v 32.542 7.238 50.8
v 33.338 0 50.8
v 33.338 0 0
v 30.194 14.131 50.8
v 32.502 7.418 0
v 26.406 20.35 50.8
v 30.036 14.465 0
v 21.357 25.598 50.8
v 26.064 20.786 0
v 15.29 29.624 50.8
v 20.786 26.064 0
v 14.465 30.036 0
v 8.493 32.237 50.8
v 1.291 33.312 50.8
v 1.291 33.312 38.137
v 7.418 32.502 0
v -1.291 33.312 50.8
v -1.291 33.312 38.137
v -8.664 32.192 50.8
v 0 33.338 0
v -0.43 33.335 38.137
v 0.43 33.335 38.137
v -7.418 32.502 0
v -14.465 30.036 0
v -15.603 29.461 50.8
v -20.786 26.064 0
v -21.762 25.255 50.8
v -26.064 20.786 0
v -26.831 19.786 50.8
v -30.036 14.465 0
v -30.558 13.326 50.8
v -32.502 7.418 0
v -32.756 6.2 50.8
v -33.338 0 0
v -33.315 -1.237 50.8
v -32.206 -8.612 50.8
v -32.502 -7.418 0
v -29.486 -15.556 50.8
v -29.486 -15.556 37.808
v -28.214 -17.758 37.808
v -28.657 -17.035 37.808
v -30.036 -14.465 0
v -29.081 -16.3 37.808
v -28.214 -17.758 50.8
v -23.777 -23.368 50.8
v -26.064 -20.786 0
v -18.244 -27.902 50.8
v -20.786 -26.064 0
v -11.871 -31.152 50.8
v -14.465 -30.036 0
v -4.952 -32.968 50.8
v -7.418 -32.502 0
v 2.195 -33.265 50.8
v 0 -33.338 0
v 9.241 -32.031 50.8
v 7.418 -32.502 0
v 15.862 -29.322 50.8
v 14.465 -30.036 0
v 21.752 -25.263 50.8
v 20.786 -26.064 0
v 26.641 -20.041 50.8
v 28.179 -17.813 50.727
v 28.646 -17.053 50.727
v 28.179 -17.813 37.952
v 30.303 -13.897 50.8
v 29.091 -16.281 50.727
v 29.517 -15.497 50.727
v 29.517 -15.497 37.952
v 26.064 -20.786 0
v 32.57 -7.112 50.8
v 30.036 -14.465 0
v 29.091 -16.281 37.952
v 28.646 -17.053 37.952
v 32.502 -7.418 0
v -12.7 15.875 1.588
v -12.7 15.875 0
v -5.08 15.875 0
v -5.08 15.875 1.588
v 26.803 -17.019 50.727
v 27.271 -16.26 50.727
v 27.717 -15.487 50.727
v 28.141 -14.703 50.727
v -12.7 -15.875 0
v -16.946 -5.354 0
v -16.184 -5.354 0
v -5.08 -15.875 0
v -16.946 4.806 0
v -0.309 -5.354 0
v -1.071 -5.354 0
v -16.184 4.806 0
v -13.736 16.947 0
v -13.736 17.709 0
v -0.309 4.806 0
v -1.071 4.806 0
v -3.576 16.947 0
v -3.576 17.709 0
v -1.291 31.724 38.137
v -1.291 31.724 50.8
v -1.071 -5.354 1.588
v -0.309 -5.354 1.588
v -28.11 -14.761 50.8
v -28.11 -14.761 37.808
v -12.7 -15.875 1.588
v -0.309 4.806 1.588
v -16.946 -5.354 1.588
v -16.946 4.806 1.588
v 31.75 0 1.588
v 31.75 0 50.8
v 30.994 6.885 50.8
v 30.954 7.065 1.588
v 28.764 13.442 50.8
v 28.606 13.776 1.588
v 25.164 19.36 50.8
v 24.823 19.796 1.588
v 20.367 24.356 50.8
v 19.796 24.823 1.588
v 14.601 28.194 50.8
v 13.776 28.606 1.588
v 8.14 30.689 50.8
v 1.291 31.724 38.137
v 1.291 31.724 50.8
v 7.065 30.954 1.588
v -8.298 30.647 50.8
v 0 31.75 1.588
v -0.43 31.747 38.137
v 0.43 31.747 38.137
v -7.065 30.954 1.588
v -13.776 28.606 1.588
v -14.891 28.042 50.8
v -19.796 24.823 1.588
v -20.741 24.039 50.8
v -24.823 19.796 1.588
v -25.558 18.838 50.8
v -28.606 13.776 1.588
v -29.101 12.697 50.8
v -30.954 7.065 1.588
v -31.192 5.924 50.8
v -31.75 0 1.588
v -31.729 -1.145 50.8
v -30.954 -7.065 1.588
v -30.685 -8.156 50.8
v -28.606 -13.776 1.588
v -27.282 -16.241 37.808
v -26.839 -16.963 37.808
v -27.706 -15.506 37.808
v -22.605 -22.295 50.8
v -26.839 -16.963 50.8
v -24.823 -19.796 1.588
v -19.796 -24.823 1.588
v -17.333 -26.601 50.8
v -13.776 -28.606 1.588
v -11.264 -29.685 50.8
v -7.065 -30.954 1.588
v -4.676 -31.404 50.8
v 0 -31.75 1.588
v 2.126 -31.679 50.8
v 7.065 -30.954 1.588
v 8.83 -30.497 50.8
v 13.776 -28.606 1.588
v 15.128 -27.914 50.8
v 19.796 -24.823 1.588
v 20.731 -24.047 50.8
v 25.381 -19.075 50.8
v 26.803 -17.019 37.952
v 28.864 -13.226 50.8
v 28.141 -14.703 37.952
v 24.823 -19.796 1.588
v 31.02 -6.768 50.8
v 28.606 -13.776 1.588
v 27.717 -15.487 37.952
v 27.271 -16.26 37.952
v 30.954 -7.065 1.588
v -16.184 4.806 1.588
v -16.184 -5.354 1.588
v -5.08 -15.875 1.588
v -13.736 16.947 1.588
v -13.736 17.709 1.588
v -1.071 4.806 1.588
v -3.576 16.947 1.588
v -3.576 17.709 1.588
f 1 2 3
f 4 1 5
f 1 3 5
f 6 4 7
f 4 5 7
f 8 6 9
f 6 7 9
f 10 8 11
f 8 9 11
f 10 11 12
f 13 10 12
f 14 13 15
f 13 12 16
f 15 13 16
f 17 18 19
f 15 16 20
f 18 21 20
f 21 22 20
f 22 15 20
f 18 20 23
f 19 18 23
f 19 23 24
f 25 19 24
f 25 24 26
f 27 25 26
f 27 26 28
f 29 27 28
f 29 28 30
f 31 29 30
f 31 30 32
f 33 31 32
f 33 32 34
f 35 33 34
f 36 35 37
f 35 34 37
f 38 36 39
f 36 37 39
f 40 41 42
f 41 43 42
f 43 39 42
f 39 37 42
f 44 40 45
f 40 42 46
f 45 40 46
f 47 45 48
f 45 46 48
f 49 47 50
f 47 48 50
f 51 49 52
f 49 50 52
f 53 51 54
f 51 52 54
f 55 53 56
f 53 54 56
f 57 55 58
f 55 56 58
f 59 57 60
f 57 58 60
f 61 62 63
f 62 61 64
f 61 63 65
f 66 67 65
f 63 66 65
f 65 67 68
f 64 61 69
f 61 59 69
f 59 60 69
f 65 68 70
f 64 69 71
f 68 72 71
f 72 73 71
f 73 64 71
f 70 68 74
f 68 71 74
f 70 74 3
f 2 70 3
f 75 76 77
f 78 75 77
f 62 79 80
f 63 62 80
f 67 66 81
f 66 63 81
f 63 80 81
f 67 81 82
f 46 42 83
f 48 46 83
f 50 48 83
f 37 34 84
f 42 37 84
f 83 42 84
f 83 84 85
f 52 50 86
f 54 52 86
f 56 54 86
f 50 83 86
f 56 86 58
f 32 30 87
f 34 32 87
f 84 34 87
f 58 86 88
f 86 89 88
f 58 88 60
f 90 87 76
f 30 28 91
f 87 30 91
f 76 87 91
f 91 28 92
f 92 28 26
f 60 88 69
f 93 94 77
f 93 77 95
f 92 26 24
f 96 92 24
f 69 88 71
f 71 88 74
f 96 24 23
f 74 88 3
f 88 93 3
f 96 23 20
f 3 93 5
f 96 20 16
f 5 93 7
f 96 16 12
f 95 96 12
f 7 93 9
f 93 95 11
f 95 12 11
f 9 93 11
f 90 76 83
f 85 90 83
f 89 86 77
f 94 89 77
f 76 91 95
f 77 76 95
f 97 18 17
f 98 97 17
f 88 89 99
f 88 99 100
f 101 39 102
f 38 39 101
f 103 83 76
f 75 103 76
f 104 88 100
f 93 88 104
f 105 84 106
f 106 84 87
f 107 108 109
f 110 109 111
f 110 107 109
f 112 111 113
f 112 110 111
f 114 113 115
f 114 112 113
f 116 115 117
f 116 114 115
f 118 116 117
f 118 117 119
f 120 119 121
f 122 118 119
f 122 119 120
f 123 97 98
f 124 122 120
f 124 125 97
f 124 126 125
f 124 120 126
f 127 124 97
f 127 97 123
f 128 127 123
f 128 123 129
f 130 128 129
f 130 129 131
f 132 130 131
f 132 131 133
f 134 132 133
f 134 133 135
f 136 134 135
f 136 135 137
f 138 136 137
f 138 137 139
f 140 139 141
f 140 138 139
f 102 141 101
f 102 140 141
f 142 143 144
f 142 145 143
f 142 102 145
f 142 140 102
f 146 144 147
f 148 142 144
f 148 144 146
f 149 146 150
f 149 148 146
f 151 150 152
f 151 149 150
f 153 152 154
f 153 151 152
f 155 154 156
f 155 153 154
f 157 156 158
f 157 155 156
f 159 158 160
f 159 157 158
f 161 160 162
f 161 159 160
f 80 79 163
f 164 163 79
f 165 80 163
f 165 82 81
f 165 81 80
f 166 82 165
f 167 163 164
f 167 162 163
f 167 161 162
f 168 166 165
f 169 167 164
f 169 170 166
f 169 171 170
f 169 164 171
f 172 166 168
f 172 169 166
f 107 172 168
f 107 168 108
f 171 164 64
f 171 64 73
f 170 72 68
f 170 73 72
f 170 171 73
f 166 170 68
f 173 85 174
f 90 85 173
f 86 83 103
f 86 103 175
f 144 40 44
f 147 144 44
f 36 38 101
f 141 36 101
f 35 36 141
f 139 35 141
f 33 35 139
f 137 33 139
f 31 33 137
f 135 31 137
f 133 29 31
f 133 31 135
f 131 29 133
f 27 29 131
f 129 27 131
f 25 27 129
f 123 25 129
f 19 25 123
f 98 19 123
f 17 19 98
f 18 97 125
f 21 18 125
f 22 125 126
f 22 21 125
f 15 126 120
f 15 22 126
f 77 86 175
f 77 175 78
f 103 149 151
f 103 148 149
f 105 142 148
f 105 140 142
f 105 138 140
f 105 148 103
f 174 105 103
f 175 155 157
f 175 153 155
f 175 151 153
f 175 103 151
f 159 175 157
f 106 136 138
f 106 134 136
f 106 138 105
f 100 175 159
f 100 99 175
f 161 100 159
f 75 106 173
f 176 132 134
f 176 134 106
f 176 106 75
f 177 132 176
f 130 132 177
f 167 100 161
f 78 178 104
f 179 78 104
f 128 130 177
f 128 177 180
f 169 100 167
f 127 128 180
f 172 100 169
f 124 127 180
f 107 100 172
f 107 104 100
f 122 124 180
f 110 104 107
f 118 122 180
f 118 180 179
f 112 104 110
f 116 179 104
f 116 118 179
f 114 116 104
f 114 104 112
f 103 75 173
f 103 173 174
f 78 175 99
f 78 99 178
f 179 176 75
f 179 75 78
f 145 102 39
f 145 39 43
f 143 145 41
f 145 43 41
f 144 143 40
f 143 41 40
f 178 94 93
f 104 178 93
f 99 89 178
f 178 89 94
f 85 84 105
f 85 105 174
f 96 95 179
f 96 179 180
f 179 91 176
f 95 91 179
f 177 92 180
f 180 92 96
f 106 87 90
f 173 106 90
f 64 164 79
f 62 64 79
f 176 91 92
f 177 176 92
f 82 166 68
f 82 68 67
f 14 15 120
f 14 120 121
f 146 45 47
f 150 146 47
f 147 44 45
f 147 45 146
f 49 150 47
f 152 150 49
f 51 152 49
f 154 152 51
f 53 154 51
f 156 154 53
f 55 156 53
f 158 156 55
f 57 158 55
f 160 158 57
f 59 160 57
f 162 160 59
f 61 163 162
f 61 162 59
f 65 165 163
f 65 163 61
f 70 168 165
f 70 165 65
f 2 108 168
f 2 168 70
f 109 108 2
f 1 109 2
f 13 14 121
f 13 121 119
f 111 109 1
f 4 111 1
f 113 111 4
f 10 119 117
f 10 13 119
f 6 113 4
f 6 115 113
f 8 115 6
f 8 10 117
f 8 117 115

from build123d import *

# Parameters (mm, degrees)
F0_R           = 33.3375
F1_DEPTH       = 50.8
F2_T           = -1.5875
F6_W           = 2.5429241359
F6_H           = 13.1887868047
F7_DEPTH       = 12.7
F10_W          = 2.6744855568
F10_H          = 12.775093317
F11_DEPTH      = 2.794
F11_DEPTH_BACK = 2.413
F13_W          = 2.5820170995
F13_H          = 12.7615630627
F14_DEPTH      = 5.0546
F14_DEPTH_BACK = 4.7244
F15_W          = 7.62
F15_H          = 31.75
F15_W_2        = 0.7620003967
F15_H_2        = 10.16
F15_W_3        = 0.762
F15_W_4        = 10.16
F15_H_3        = 0.762
F16_DEPTH      = 9.906


with BuildPart() as f1:
    # F0 (on Top) → F1 (new body)
    with BuildSketch(Plane.XY):
        Circle(F0_R)
    extrude(amount=F1_DEPTH)

    # F2
    f2_openings = [f1.faces().sort_by_distance(p)[0] for p in [
        (0, 0, 50.8),
    ]]
    offset(amount=F2_T, openings=f2_openings)

    # F6 (on offset) → F7 (cut)
    with BuildSketch(Plane(origin=(-28.8711218987, -16.66875, 0), x_dir=(0.5, -0.8660254038, 0), z_dir=(-0.8660254038, -0.5, 0))):
        with Locations((0, 44.4019660354)):
            Rectangle(F6_W, F6_H)
    extrude(amount=-F7_DEPTH, mode=Mode.SUBTRACT)

    # F10 (on offset) → F11 (cut, two sides)
    with BuildSketch(Plane(origin=(28.8161292855, -16.637, 0), x_dir=(0.5, 0.8660254038, 0), z_dir=(0.8660254038, -0.5, 0))) as f11_sk:
        with Locations((0, 44.3391613662)):
            Rectangle(F10_W, F10_H)
    extrude(amount=-F11_DEPTH, mode=Mode.SUBTRACT)
    extrude(f11_sk.sketch, amount=F11_DEPTH_BACK, mode=Mode.SUBTRACT)

    # F13 (on offset) → F14 (cut, two sides)
    with BuildSketch(Plane.XZ.offset(-33.81375)) as f14_sk:
        with Locations((0, 44.5175170898)):
            Rectangle(F13_W, F13_H)
    extrude(amount=-F14_DEPTH, mode=Mode.SUBTRACT)
    extrude(f14_sk.sketch, amount=F14_DEPTH_BACK, mode=Mode.SUBTRACT)

    # F15 (on Top) → F16 (cut)
    with BuildSketch(Plane.XY):
        with Locations((-8.89, 0)):
            Rectangle(F15_W, F15_H)
        with Locations((-0.6896582572, -0.2738600914)):
            Rectangle(F15_W_2, F15_H_2)
        with Locations((-16.5646602053, -0.2738598244)):
            Rectangle(F15_W_3, F15_H_2)
        with Locations((-8.6557281865, 17.3283369606)):
            Rectangle(F15_W_4, F15_H_3)
    extrude(amount=F16_DEPTH, mode=Mode.SUBTRACT)


solid = f1.part
